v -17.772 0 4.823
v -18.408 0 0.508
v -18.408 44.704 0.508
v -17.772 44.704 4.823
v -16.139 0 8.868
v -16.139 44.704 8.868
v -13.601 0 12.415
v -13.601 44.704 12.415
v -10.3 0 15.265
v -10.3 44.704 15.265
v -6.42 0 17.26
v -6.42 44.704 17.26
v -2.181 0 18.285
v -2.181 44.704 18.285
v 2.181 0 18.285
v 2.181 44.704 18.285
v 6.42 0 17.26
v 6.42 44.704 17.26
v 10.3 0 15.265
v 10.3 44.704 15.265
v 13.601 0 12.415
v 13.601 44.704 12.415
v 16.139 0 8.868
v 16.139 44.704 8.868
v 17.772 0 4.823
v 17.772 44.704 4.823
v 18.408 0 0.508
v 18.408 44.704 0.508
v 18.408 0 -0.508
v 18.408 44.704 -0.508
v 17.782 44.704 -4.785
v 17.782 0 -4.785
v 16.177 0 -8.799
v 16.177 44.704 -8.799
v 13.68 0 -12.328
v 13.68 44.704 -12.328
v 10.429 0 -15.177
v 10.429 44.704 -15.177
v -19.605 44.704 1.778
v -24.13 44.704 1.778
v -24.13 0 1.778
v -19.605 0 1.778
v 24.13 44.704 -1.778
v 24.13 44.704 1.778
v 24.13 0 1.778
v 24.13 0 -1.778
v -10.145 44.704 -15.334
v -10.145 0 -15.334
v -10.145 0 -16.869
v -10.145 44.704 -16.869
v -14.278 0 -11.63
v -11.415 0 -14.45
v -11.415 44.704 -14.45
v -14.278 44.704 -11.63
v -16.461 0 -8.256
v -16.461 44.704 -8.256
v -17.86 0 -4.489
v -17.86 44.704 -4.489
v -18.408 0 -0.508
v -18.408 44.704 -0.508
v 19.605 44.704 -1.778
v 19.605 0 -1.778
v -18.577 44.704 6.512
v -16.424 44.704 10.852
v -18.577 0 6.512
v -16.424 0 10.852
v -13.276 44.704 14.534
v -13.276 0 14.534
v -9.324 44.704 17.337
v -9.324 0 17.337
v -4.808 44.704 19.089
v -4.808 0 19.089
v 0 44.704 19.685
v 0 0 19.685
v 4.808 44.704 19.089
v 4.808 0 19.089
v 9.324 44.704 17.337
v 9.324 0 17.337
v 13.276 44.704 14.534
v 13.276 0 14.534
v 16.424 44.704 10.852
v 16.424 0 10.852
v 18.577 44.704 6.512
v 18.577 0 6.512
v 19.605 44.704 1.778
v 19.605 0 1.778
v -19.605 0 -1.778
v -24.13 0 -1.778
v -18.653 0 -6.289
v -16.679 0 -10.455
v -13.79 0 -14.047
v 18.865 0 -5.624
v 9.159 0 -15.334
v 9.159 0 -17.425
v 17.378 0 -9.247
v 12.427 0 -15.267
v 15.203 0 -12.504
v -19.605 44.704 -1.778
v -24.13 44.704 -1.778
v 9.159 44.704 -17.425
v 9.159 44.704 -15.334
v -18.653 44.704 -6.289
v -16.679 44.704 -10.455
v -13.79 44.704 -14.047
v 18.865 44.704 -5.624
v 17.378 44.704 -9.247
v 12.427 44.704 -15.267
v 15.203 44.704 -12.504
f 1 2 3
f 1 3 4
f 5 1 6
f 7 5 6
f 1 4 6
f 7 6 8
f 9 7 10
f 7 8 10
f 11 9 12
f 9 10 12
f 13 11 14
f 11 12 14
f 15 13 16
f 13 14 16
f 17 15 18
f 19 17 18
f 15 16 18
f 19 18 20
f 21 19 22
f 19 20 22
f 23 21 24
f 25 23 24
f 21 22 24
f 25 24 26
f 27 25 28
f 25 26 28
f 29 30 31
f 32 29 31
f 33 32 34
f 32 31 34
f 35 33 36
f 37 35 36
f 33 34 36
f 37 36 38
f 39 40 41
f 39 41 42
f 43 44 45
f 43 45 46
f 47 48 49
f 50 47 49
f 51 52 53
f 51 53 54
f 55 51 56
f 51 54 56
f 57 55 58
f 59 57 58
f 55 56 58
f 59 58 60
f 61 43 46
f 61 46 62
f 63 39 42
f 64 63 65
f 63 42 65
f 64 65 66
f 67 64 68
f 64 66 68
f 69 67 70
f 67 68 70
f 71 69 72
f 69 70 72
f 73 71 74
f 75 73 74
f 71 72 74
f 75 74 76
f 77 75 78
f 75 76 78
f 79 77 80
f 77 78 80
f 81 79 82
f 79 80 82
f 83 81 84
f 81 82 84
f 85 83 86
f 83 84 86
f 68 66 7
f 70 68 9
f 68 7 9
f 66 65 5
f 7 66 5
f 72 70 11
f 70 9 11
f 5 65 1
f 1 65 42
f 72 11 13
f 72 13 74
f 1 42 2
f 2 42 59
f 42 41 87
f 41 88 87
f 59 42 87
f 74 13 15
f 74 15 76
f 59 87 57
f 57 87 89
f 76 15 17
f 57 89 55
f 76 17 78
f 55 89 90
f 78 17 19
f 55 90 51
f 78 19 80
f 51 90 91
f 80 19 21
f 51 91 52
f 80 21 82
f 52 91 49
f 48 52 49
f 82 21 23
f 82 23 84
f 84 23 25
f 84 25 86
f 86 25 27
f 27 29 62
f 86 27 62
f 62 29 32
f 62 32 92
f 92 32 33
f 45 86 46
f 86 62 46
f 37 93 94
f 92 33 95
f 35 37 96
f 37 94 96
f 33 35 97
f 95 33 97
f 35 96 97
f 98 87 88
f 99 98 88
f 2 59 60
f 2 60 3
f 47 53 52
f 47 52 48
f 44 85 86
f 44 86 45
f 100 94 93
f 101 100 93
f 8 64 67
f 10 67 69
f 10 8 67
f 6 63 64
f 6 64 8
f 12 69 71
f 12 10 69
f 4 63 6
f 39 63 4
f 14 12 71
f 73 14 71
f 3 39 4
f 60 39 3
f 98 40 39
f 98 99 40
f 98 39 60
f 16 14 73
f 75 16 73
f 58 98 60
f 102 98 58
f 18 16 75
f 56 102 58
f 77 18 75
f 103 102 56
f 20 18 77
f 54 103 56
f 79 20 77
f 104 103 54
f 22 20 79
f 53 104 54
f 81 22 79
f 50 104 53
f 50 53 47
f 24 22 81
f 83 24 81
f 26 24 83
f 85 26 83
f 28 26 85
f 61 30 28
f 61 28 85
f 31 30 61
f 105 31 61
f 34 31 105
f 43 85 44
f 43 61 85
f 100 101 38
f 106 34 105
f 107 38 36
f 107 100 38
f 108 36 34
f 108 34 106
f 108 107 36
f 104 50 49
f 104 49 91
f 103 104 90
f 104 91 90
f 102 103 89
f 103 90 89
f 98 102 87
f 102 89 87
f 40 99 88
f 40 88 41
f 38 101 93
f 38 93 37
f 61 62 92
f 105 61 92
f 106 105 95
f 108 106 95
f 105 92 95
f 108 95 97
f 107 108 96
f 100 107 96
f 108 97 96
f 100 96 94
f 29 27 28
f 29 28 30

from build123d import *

# Parameters (mm, degrees)
BOSS_EXTRUDE1_DEPTH = 44.704
CUT_EXTRUDE1_DEPTH  = 55.481223747
CUT_EXTRUDE2_DEPTH  = 55.481223747


with BuildPart() as part:
    # Sketch1 → Boss-Extrude1 (new body)
    with BuildSketch(Plane(origin=(0, 0, 0), x_dir=(1, 0, 0), z_dir=(0, 1, 0))):
        with BuildLine():
            Line((19.604538786, -1.778), (-19.604538786, -1.778))
            ThreePointArc((-19.604538786, -1.778), (0, -19.685), (19.604538786, -1.778))
        make_face()
        with BuildLine():
            Line((-24.13, 1.778), (-24.13, -1.778))
            Line((-24.13, -1.778), (-19.604538786, -1.778))
            ThreePointArc((-19.604538786, -1.778), (-19.685, 0), (-19.604538786, 1.778))
            Line((-19.604538786, 1.778), (-24.13, 1.778))
        make_face()
        with BuildLine():
            ThreePointArc((19.685, 0), (19.664874408, -0.889909828), (19.604538786, -1.778))
            Line((19.604538786, -1.778), (24.13, -1.778))
            Line((24.13, -1.778), (24.13, 1.778))
            Line((24.13, 1.778), (19.604538786, 1.778))
            ThreePointArc((19.604538786, 1.778), (19.664874408, 0.889909828), (19.685, 0))
        make_face()
        with BuildLine():
            ThreePointArc((-19.604538786, 1.778), (-19.685, 0), (-19.604538786, -1.778))
            Line((-19.604538786, -1.778), (19.604538786, -1.778))
            ThreePointArc((19.604538786, -1.778), (19.664874408, -0.889909828), (19.685, 0))
            ThreePointArc((19.685, 0), (19.664874408, 0.889909828), (19.604538786, 1.778))
            Line((19.604538786, 1.778), (-19.604538786, 1.778))
        make_face()
        with BuildLine():
            ThreePointArc((-10.145068686, 16.869404446), (-16.679250829, 10.454750919), (-19.604538786, 1.778))
            Line((-19.604538786, 1.778), (19.604538786, 1.778))
            ThreePointArc((19.604538786, 1.778), (16.371852187, 10.929852742), (9.158931314, 17.424500056))
            Line((9.158931314, 17.424500056), (9.158931314, 11.559229776))
            Line((9.158931314, 11.559229776), (-10.145068686, 11.559229776))
            Line((-10.145068686, 11.559229776), (-10.145068686, 16.869404446))
        make_face()
    extrude(amount=BOSS_EXTRUDE1_DEPTH)

    # Sketch3 → Cut-Extrude1 (cut, through all)
    with BuildSketch(Plane(origin=(0, 44.704, 0), x_dir=(1, 0, 0), z_dir=(0, 1, 0))):
        with BuildLine():
            Line((-18.40799177, 0.508), (-18.40799177, -0.508))
            ThreePointArc((-18.40799177, -0.508), (0, -18.415), (18.40799177, -0.508))
            Line((18.40799177, -0.508), (18.40799177, 0.508))
            ThreePointArc((18.40799177, 0.508), (16.176802096, 8.799051026), (10.428931314, 15.177273031))
            Line((10.428931314, 15.177273031), (10.428931314, 10.289229776))
            Line((10.428931314, 10.289229776), (-11.415068686, 10.289229776))
            Line((-11.415068686, 10.289229776), (-11.415068686, 14.450205254))
            ThreePointArc((-11.415068686, 14.450205254), (-16.460559091, 8.256041389), (-18.40799177, 0.508))
        make_face()
    extrude(amount=-CUT_EXTRUDE1_DEPTH, mode=Mode.SUBTRACT)

    # Sketch4 → Cut-Extrude2 (cut, through all)
    with BuildSketch(Plane(origin=(0, 44.704, 0), x_dir=(1, 0, 0), z_dir=(0, 1, 0))):
        Polygon((-11.415068686, 14.450205254), (-10.145068686, 15.334289128), (9.158931314, 15.334289128), (10.428931314, 15.177273031), (10.428931314, 10.289229776), (-11.415068686, 10.289229776), align=None)
    extrude(amount=-CUT_EXTRUDE2_DEPTH, mode=Mode.SUBTRACT)


solid = part.part
